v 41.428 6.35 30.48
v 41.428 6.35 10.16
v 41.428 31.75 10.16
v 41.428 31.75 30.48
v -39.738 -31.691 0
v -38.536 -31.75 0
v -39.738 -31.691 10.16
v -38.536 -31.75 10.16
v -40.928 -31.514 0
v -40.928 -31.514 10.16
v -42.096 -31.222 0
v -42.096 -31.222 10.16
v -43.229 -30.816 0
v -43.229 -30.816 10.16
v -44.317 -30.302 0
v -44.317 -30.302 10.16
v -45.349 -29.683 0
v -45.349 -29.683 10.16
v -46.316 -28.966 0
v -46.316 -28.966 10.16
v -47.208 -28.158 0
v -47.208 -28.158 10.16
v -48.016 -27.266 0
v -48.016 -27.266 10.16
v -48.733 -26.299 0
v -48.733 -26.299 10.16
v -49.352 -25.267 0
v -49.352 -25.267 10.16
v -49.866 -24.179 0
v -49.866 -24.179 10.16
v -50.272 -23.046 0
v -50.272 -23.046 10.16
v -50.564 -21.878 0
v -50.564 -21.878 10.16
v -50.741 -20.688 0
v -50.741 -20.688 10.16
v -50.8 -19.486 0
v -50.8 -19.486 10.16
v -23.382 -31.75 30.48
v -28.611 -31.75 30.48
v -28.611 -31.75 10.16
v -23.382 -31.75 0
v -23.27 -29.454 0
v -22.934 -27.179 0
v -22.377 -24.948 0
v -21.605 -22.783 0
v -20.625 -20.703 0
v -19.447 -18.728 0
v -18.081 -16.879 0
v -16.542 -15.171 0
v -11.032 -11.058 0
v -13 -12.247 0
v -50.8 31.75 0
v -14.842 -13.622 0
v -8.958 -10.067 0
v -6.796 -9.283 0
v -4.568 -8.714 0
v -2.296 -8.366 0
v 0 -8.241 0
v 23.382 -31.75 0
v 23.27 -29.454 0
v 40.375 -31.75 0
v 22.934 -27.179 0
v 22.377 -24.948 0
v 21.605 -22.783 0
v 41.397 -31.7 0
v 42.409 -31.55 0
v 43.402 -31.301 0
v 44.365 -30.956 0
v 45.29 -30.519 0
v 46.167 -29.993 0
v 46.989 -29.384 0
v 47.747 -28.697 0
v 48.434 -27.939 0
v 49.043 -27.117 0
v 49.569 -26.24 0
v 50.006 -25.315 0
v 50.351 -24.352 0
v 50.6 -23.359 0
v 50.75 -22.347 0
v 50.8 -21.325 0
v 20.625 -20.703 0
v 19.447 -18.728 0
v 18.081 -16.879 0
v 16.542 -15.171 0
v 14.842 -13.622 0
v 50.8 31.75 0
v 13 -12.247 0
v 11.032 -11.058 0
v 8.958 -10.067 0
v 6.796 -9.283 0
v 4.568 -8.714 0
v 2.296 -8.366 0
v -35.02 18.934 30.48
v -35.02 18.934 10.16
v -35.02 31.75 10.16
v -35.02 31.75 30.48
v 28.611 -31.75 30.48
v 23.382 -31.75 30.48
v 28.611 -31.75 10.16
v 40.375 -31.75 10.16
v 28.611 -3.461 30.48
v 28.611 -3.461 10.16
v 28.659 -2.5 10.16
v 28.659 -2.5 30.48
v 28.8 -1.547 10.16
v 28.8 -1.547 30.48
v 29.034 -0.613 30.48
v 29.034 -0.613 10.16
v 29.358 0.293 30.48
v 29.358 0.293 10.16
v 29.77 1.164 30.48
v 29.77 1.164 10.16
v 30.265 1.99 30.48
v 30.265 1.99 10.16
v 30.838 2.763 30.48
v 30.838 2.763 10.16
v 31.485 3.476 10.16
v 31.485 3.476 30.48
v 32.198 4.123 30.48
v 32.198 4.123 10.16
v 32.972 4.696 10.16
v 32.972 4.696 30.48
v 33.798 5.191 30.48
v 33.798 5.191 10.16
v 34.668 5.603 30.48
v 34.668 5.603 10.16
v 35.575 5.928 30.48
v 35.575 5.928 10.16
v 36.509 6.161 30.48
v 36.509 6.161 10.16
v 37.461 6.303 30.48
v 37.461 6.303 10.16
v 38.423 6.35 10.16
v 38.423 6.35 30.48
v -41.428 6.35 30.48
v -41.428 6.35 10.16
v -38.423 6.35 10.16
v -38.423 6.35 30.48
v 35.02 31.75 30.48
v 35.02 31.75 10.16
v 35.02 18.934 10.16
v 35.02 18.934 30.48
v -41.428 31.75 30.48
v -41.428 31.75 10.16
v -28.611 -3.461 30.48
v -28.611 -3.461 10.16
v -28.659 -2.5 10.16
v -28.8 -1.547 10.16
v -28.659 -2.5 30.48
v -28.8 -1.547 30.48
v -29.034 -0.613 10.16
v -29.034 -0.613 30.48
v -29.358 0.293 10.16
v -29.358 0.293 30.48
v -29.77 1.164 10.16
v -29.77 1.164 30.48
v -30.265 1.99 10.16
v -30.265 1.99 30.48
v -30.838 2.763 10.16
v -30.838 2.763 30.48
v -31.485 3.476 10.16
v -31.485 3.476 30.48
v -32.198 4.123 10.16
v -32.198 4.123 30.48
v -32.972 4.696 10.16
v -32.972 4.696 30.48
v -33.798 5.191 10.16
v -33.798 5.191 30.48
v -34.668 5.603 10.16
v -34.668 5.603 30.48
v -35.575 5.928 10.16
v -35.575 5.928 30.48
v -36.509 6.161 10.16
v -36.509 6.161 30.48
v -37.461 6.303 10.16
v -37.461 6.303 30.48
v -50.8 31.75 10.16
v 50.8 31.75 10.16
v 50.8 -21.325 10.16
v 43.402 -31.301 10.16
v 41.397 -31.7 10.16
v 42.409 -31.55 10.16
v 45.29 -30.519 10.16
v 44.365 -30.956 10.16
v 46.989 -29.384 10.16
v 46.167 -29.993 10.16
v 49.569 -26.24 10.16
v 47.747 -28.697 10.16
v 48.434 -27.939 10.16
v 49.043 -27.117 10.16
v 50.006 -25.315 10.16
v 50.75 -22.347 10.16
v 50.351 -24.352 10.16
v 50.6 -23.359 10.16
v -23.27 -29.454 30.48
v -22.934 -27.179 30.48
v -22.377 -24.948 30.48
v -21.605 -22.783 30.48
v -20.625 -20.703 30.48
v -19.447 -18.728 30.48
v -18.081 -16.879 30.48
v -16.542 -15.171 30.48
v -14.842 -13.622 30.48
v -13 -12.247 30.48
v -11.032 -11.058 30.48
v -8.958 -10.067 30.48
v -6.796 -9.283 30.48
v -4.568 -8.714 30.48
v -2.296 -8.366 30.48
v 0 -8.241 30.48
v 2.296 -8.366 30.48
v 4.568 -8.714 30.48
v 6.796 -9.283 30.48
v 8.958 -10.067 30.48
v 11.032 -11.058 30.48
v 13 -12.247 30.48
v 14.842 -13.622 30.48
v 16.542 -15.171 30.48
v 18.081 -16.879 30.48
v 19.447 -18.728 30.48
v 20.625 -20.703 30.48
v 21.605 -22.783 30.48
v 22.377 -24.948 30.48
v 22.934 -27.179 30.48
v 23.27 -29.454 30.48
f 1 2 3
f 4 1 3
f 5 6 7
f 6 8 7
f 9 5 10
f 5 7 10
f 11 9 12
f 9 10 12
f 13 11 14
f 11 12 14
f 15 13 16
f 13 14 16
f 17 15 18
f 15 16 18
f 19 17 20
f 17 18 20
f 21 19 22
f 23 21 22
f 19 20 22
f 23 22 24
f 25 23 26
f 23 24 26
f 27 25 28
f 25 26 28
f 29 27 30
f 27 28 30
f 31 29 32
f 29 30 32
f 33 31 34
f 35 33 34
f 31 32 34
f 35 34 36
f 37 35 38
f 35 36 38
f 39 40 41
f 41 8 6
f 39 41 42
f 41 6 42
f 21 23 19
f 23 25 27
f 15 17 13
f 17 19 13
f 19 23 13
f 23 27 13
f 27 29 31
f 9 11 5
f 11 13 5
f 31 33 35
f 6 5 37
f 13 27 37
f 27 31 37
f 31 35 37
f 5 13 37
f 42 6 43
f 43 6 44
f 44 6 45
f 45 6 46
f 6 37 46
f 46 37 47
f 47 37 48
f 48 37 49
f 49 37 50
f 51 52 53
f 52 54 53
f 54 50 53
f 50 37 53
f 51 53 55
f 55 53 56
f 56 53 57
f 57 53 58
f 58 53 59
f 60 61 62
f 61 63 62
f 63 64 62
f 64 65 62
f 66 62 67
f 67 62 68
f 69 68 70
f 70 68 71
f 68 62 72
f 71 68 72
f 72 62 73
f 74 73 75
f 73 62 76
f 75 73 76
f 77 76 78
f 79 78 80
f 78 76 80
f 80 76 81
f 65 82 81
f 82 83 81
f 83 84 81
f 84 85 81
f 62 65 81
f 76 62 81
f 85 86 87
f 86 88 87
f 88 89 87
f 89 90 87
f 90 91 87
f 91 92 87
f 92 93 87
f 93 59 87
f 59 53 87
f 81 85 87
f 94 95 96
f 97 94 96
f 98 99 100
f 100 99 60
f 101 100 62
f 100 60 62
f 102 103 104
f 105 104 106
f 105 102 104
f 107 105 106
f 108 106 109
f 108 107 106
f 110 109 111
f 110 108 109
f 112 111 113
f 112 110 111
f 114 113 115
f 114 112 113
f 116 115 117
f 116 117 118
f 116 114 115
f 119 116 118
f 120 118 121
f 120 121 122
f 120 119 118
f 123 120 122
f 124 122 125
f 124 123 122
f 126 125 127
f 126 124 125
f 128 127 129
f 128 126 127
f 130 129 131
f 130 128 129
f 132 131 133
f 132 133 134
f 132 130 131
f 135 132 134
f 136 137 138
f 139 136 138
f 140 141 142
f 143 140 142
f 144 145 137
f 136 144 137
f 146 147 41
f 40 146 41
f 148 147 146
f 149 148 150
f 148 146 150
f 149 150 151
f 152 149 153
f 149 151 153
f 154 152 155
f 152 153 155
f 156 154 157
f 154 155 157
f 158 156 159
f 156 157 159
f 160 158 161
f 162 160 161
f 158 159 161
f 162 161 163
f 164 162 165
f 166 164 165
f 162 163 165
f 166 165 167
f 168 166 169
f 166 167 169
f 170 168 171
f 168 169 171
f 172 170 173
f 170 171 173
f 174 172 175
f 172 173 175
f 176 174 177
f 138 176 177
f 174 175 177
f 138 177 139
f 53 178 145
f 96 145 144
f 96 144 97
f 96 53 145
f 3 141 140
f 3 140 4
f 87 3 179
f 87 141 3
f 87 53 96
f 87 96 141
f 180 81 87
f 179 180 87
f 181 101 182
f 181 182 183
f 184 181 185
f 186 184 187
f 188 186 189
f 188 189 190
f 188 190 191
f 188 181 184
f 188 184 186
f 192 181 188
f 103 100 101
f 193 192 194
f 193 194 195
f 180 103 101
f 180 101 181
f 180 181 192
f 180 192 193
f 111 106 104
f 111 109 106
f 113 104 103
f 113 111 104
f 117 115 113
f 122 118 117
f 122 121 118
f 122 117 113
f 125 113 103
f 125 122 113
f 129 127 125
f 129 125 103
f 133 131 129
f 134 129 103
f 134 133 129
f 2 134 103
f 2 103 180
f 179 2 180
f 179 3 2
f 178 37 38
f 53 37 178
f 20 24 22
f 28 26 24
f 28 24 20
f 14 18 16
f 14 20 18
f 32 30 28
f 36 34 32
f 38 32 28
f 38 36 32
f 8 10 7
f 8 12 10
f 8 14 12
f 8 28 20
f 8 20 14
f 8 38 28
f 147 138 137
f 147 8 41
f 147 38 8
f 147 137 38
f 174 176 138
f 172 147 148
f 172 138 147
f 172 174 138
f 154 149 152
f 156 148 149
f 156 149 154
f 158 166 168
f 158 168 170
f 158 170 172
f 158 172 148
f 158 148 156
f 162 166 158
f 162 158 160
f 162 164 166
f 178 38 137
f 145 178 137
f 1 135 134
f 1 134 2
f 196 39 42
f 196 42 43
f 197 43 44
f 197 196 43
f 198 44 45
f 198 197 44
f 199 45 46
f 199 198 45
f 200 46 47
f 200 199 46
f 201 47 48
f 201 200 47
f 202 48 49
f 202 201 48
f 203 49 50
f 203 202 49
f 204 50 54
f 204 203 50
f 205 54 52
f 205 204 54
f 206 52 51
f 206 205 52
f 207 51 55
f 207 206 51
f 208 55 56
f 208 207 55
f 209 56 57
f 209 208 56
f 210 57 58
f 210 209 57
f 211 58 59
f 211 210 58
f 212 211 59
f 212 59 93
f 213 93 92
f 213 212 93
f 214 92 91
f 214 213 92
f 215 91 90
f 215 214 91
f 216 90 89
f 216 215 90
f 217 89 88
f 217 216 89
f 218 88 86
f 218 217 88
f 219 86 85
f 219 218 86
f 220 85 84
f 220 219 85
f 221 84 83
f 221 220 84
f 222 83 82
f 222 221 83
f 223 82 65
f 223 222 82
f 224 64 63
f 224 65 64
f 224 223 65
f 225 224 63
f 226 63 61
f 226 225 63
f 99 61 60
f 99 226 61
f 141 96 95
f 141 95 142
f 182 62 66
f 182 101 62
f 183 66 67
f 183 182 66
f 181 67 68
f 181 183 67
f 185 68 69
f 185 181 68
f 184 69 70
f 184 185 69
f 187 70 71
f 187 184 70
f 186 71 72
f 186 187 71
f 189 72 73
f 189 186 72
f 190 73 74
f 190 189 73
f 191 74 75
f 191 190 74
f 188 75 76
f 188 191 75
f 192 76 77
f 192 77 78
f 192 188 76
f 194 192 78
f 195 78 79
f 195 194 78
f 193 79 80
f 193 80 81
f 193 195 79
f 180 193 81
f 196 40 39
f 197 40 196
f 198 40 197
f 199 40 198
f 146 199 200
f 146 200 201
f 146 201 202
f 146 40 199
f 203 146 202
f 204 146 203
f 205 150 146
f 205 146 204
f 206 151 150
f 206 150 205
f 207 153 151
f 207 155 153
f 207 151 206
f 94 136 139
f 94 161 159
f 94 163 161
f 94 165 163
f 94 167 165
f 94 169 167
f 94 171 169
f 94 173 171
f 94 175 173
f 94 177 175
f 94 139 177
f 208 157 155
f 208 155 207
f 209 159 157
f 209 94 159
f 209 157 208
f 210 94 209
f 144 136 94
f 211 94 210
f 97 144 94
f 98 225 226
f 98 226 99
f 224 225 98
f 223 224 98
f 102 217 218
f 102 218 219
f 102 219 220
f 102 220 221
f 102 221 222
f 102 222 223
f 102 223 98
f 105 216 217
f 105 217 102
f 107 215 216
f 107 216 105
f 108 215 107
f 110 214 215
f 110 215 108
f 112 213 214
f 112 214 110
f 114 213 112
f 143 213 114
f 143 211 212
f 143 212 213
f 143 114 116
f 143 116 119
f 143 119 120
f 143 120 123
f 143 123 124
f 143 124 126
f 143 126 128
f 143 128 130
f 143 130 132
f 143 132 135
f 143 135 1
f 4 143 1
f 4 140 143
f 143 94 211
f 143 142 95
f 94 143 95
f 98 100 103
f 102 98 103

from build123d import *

# Parameters (mm, degrees)
F0_W     = 101.6
F0_H     = 63.5
F1_DEPTH = 10.16
F3_DEPTH = 30.48
F4_DEPTH = 25.4
F5_R     = 10.4245741623
F6_R     = 12.2642048969
F7_R     = 9.8113639175


with BuildPart() as f1:
    # F0 (on Top) → F1 (new body)
    with BuildSketch(Plane.XY):
        Rectangle(F0_W, F0_H)
    extrude(amount=F1_DEPTH)

    # F2 (on Top) → F3 (join)
    with BuildSketch(Plane.XY):
        with BuildLine():
            Line((-41.4277352393, 31.75), (-41.4277352393, 6.35))
            Line((-41.4277352393, 6.35), (-28.6113340408, 6.35))
            Line((-28.6113340408, 6.35), (-28.6113340408, -31.75))
            Line((-28.6113340408, -31.75), (-23.3824987947, -31.75))
            ThreePointArc((-23.3824987947, -31.75), (-16.5415723839, -15.1712032327), (0, -8.2407516258))
            ThreePointArc((0, -8.2407516258), (16.5415723839, -15.1712032327), (23.3824987947, -31.75))
            Line((23.3824987947, -31.75), (28.6113340408, -31.75))
            Line((28.6113340408, -31.75), (28.6113340408, 6.35))
            Line((28.6113340408, 6.35), (41.4277352393, 6.35))
            Line((41.4277352393, 6.35), (41.4277352393, 31.75))
            Line((41.4277352393, 31.75), (35.0195355713, 31.75))
            Line((35.0195355713, 31.75), (35.0195355713, 18.9336006641))
            Line((35.0195355713, 18.9336006641), (0, 18.9336006641))
            Line((0, 18.9336006641), (-35.0195355713, 18.9336006641))
            Line((-35.0195355713, 18.9336006641), (-35.0195355713, 31.75))
            Line((-35.0195355713, 31.75), (-41.4277352393, 31.75))
        make_face()
    extrude(amount=F3_DEPTH)

    # F4 (cut): a face of the model
    f4_faces = [f1.faces().sort_by_distance(p)[0] for p in [
        (0, -21.7845350745, 10.16),
    ]]
    extrude(f4_faces, amount=-F4_DEPTH, mode=Mode.SUBTRACT)

    # F5
    f5_edges = [f1.edges().sort_by_distance(p)[0] for p in [
        (50.8, -31.75, 5.08),
    ]]
    fillet(f5_edges, radius=F5_R)

    # F6
    f6_edges = [f1.edges().sort_by_distance(p)[0] for p in [
        (-50.8, -31.75, 5.08),
    ]]
    fillet(f6_edges, radius=F6_R)

    # F7
    f7_edges = [f1.edges().sort_by_distance(p)[0] for p in [
        (28.611334, 6.35, 20.32),
        (-28.611334, 6.35, 20.32),
    ]]
    fillet(f7_edges, radius=F7_R)


solid = f1.part
